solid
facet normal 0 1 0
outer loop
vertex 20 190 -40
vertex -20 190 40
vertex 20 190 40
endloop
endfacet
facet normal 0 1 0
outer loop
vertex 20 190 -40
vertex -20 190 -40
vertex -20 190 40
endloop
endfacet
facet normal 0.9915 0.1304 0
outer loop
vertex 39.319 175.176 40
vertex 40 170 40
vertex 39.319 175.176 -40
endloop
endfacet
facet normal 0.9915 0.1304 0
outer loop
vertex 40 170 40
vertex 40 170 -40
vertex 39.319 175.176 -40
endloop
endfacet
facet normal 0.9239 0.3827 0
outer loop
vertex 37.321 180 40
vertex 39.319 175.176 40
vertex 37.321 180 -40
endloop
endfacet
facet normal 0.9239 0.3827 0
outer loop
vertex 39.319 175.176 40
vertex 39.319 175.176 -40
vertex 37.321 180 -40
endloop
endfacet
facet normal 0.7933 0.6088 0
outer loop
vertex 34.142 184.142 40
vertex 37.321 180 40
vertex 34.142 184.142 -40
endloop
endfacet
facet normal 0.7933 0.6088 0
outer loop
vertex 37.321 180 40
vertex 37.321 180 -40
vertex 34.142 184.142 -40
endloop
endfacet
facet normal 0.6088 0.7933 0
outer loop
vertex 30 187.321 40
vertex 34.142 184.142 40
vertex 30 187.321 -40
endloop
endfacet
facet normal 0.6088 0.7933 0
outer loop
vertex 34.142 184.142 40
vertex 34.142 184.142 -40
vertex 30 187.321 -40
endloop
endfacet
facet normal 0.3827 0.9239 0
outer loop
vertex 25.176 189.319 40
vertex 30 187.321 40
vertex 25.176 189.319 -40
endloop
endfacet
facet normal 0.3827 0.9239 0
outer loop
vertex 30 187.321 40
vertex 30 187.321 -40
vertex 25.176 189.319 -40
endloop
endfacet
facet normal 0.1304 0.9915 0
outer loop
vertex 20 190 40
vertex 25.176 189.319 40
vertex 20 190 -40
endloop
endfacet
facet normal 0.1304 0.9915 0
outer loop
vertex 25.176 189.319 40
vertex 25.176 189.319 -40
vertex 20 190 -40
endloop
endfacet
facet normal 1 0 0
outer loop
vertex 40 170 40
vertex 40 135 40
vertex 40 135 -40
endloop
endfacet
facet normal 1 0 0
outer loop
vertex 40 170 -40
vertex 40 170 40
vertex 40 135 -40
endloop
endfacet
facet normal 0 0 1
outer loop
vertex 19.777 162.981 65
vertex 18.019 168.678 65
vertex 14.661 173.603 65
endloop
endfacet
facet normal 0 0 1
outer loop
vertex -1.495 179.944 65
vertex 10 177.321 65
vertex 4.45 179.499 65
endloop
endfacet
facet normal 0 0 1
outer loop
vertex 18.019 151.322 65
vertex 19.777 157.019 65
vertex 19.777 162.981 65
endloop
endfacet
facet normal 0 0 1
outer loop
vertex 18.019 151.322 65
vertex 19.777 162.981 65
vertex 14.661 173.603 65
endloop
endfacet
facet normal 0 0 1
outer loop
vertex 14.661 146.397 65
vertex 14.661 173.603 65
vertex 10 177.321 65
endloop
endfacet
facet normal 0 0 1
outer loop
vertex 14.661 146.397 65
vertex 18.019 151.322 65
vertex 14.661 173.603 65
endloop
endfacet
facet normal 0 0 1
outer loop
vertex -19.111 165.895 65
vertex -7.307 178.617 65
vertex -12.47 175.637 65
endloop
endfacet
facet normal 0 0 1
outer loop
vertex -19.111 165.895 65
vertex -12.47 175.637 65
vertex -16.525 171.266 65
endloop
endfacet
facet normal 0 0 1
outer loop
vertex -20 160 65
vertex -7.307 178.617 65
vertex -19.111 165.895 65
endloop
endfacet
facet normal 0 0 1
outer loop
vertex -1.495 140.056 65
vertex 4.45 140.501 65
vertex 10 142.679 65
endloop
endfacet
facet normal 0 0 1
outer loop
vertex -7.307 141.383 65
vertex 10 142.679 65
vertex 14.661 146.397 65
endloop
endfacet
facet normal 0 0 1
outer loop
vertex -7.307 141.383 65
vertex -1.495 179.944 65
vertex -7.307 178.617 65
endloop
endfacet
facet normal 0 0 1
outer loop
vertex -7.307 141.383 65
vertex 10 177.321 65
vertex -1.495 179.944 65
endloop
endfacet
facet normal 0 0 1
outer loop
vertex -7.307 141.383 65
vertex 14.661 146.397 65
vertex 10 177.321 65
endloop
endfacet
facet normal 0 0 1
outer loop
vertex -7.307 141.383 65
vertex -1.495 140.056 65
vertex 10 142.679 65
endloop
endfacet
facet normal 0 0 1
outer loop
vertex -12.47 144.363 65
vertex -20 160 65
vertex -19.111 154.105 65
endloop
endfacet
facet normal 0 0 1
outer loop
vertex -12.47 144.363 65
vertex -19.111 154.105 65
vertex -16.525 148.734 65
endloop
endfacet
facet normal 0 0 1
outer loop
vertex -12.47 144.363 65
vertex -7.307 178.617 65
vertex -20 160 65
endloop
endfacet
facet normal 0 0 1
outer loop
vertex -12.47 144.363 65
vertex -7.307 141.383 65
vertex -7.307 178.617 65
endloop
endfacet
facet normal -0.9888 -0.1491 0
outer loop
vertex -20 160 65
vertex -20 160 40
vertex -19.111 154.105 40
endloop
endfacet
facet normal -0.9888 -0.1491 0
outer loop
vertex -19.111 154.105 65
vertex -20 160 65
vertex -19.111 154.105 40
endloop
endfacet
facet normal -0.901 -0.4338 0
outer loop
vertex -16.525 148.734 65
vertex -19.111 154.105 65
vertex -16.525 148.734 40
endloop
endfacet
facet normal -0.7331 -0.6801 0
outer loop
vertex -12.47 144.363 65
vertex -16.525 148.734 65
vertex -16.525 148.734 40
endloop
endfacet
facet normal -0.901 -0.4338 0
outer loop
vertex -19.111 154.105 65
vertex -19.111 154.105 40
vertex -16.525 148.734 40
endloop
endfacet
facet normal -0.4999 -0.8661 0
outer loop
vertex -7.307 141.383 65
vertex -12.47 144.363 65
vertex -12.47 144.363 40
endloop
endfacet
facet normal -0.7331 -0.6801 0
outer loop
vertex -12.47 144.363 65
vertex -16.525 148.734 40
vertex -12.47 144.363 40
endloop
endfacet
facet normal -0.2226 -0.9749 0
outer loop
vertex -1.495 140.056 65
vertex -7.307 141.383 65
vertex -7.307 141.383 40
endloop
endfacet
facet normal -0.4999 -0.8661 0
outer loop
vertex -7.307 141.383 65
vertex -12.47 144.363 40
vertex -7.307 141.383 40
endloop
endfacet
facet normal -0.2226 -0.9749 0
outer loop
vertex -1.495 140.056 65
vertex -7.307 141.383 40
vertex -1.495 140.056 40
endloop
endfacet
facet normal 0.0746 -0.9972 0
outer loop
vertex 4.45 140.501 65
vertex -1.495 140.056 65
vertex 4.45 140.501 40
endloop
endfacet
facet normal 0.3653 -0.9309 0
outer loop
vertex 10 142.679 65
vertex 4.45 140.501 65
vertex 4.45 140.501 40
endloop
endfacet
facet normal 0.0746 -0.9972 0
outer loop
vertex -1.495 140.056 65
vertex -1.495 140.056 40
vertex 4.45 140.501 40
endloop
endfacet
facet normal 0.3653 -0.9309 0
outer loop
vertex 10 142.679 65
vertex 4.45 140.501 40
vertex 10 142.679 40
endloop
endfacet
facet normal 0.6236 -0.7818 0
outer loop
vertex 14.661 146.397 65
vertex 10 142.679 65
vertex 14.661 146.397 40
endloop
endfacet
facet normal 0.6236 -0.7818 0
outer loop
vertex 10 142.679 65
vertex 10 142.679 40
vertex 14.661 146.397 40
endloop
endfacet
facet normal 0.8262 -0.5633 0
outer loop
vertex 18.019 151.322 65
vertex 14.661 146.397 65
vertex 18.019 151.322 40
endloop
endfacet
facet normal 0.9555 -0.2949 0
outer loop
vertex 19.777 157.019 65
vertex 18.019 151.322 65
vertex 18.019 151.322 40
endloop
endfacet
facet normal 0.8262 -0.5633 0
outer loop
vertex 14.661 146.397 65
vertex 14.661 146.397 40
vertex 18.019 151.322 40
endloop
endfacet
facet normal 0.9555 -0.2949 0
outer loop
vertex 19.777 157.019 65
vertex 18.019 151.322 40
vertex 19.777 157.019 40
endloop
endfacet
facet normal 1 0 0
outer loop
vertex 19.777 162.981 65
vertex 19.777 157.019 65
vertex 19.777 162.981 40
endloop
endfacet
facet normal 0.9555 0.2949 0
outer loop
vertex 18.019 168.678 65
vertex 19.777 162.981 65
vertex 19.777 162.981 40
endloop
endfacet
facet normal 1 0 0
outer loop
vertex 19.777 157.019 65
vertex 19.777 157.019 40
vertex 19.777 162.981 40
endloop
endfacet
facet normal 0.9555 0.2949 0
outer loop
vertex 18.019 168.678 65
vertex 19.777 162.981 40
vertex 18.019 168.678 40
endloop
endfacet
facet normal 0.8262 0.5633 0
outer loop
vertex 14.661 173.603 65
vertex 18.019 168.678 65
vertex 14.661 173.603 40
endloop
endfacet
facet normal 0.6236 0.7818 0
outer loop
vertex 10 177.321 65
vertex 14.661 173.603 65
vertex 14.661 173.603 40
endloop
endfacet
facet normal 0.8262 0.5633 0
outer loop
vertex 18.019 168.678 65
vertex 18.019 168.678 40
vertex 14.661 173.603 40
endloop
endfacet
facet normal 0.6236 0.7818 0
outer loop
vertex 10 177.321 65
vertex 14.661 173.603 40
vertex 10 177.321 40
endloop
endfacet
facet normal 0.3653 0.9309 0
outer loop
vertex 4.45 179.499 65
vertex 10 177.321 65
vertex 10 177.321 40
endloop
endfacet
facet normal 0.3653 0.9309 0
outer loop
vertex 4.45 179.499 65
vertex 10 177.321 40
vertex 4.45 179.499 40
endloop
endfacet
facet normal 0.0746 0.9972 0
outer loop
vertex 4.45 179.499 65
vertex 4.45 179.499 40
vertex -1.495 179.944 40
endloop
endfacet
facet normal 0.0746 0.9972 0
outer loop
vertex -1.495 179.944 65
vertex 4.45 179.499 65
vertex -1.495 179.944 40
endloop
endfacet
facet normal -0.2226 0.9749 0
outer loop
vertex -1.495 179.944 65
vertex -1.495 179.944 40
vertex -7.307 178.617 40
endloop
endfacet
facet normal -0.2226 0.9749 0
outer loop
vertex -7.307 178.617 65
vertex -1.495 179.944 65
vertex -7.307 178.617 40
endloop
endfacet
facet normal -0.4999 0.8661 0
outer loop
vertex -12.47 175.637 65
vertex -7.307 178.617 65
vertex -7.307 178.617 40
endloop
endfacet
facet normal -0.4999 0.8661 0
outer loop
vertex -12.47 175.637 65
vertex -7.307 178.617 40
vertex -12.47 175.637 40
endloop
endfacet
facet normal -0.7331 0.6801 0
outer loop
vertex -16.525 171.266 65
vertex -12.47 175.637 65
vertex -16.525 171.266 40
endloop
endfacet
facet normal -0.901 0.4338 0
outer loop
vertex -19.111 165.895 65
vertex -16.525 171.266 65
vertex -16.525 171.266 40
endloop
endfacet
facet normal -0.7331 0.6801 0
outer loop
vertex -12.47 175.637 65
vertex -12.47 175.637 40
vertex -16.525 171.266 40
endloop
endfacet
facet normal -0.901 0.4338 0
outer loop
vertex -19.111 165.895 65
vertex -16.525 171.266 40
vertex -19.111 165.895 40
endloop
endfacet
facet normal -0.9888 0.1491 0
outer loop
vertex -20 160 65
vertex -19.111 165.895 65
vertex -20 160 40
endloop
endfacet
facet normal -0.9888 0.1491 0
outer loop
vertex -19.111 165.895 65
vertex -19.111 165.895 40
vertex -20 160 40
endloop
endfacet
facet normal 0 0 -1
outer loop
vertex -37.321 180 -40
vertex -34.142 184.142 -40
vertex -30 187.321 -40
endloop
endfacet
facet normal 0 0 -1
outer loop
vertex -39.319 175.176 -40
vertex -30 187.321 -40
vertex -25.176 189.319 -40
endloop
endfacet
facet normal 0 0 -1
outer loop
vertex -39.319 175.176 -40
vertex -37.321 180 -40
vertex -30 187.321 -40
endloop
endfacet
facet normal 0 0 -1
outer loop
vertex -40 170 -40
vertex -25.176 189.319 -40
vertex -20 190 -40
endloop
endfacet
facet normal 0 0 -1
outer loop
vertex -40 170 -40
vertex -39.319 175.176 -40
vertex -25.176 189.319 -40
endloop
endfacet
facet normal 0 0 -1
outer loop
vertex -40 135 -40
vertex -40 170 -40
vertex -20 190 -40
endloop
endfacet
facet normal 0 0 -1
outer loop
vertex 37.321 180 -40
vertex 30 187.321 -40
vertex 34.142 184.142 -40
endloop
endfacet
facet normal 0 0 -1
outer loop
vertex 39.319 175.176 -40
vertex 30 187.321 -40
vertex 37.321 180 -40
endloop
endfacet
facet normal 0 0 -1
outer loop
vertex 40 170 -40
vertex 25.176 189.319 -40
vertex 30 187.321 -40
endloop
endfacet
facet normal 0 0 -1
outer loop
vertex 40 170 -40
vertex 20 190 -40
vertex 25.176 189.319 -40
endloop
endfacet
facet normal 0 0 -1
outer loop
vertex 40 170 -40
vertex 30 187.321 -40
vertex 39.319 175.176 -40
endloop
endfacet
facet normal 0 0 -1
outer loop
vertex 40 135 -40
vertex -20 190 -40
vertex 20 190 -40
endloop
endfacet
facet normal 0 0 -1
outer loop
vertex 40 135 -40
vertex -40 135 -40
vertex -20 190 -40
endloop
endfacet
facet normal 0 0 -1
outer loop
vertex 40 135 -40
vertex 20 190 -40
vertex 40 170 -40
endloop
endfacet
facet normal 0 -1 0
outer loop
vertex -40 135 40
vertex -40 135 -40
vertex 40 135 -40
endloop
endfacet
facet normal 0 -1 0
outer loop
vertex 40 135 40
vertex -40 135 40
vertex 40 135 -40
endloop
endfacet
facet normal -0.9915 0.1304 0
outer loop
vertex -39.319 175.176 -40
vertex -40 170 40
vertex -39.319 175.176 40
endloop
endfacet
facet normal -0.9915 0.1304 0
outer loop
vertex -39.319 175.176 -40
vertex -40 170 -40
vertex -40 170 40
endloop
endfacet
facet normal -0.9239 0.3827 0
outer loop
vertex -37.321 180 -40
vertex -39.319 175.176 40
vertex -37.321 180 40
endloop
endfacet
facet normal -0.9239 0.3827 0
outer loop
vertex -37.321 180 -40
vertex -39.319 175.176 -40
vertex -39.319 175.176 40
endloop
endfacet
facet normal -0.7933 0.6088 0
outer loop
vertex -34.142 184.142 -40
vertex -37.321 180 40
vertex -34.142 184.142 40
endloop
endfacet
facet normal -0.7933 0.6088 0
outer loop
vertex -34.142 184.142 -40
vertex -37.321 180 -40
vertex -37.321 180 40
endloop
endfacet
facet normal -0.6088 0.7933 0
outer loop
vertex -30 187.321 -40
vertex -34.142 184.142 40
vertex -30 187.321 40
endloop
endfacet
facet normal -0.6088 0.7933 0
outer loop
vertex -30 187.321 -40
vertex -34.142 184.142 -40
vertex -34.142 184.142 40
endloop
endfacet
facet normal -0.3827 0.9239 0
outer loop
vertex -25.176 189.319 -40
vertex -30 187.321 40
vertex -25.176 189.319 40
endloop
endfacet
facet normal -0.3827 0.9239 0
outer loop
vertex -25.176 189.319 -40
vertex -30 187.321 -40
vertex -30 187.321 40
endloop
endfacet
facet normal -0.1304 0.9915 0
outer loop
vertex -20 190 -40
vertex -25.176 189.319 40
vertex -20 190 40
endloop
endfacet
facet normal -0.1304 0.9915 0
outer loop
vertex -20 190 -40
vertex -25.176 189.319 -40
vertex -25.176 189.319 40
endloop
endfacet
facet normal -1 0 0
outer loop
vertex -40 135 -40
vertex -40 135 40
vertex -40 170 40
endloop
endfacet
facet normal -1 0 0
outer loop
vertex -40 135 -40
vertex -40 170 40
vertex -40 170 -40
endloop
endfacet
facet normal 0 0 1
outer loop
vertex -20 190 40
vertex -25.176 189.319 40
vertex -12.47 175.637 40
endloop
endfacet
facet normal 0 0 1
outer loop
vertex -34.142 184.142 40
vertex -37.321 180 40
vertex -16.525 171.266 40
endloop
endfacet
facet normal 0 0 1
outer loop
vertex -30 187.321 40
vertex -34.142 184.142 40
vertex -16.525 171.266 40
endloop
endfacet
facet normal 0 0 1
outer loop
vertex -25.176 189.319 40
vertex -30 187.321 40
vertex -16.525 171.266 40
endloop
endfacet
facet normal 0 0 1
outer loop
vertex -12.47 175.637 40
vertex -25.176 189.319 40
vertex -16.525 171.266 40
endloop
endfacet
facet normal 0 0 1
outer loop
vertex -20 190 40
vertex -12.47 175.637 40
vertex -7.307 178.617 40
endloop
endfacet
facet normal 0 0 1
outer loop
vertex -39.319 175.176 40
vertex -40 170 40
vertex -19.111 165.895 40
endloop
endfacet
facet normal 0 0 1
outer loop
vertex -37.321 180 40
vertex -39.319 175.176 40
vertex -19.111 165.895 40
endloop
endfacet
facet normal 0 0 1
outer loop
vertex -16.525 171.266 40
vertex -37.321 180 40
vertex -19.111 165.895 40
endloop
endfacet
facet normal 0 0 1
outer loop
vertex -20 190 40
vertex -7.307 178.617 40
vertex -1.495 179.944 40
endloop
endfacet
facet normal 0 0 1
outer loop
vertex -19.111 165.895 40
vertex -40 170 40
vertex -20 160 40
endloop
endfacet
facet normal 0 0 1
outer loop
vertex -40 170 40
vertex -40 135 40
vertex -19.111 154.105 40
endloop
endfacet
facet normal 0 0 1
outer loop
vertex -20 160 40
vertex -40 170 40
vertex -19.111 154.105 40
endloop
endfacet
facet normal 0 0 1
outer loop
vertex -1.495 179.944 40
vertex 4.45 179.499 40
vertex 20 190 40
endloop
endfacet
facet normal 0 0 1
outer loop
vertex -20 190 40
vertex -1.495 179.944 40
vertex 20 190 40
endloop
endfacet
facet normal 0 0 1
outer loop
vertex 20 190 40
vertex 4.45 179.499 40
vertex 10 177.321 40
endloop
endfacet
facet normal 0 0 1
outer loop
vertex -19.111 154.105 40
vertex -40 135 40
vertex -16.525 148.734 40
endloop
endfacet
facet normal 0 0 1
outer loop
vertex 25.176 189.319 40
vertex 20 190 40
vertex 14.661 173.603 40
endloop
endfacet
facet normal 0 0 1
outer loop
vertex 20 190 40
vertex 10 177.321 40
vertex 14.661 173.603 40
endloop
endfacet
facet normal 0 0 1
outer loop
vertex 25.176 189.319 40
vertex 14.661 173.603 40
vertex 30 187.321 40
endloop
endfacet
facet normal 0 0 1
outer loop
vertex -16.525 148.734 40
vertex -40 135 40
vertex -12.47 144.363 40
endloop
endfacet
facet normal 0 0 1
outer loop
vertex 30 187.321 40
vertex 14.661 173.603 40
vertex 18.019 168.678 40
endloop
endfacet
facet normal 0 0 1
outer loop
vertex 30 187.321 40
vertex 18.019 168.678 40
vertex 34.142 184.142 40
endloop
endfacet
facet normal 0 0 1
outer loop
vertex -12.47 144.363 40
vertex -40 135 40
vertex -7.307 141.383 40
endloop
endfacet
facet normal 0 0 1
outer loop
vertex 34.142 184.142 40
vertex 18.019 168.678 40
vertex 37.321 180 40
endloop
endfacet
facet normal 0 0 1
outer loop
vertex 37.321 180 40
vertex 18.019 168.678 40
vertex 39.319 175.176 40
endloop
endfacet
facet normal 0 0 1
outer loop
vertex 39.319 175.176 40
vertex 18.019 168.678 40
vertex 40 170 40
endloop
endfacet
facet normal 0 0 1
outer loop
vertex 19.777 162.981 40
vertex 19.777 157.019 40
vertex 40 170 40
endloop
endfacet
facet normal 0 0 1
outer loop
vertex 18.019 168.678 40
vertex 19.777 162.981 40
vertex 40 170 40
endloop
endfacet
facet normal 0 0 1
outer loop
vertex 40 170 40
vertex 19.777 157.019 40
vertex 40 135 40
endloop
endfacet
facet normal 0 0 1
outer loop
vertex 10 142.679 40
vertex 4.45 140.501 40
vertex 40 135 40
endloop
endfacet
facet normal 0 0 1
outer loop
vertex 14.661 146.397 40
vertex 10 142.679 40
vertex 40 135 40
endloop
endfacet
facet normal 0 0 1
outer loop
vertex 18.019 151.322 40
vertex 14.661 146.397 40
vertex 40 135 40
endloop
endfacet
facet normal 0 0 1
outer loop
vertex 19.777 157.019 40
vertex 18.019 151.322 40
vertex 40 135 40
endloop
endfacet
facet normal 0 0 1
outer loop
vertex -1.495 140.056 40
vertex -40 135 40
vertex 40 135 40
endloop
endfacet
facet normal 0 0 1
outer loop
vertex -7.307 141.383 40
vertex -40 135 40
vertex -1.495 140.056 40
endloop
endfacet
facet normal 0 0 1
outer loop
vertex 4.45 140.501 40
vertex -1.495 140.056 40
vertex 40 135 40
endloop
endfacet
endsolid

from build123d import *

# Parameters (mm, degrees)
ESBO_O1_W                = 80
ESBO_O1_H                = 80
RESSALTO_EXTRUS_O1_DEPTH = 190
FILETE2_R                = 20
ESBO_O2_R                = 20
RESSALTO_EXTRUS_O2_DEPTH = 25
ESBO_O3_W                = 70
ESBO_O3_H                = 70
CORTE_EXTRUS_O1_DEPTH    = 135
ESBO_O4_R                = 15
CORTE_EXTRUS_O2_DEPTH    = 5


with BuildPart() as part:
    # Esboço1 → Ressalto-extrusão1 (new body)
    with BuildSketch(Plane(origin=(0, 0, 0), x_dir=(1, 0, 0), z_dir=(0, 1, 0))):
        Rectangle(ESBO_O1_W, ESBO_O1_H)
    extrude(amount=RESSALTO_EXTRUS_O1_DEPTH)

    # Filete2
    filete2_edges = [part.edges().sort_by_distance(p)[0] for p in [
        (40, 190, 0),
        (-40, 190, 0),
    ]]
    fillet(filete2_edges, radius=FILETE2_R)

    # Esboço2 → Ressalto-extrusão2 (add)
    with BuildSketch(Plane.XY.offset(40)):
        with Locations(Location((0, 160, 0), (0, 0, 180))):
            Circle(ESBO_O2_R)
    extrude(amount=RESSALTO_EXTRUS_O2_DEPTH)

    # Esboço3 → Corte-extrusão1 (cut)
    with BuildSketch(Plane(origin=(0, 0, 0), x_dir=(-1, 0, 0), z_dir=(0, -1, 0))):
        Rectangle(ESBO_O3_W, ESBO_O3_H)
    extrude(amount=-CORTE_EXTRUS_O1_DEPTH, mode=Mode.SUBTRACT)

    # Esboço4 → Corte-extrusão2 (cut)
    with BuildSketch(Plane.XY.offset(40)):
        with Locations((0, 90)):
            Circle(ESBO_O4_R)
    extrude(amount=-CORTE_EXTRUS_O2_DEPTH, mode=Mode.SUBTRACT)

    # Corte de superfície1
    split(bisect_by=Plane(origin=(0, 135, 0), x_dir=(1, 0, 0), z_dir=(0, 1, 0)), keep=Keep.TOP)


solid = part.part
